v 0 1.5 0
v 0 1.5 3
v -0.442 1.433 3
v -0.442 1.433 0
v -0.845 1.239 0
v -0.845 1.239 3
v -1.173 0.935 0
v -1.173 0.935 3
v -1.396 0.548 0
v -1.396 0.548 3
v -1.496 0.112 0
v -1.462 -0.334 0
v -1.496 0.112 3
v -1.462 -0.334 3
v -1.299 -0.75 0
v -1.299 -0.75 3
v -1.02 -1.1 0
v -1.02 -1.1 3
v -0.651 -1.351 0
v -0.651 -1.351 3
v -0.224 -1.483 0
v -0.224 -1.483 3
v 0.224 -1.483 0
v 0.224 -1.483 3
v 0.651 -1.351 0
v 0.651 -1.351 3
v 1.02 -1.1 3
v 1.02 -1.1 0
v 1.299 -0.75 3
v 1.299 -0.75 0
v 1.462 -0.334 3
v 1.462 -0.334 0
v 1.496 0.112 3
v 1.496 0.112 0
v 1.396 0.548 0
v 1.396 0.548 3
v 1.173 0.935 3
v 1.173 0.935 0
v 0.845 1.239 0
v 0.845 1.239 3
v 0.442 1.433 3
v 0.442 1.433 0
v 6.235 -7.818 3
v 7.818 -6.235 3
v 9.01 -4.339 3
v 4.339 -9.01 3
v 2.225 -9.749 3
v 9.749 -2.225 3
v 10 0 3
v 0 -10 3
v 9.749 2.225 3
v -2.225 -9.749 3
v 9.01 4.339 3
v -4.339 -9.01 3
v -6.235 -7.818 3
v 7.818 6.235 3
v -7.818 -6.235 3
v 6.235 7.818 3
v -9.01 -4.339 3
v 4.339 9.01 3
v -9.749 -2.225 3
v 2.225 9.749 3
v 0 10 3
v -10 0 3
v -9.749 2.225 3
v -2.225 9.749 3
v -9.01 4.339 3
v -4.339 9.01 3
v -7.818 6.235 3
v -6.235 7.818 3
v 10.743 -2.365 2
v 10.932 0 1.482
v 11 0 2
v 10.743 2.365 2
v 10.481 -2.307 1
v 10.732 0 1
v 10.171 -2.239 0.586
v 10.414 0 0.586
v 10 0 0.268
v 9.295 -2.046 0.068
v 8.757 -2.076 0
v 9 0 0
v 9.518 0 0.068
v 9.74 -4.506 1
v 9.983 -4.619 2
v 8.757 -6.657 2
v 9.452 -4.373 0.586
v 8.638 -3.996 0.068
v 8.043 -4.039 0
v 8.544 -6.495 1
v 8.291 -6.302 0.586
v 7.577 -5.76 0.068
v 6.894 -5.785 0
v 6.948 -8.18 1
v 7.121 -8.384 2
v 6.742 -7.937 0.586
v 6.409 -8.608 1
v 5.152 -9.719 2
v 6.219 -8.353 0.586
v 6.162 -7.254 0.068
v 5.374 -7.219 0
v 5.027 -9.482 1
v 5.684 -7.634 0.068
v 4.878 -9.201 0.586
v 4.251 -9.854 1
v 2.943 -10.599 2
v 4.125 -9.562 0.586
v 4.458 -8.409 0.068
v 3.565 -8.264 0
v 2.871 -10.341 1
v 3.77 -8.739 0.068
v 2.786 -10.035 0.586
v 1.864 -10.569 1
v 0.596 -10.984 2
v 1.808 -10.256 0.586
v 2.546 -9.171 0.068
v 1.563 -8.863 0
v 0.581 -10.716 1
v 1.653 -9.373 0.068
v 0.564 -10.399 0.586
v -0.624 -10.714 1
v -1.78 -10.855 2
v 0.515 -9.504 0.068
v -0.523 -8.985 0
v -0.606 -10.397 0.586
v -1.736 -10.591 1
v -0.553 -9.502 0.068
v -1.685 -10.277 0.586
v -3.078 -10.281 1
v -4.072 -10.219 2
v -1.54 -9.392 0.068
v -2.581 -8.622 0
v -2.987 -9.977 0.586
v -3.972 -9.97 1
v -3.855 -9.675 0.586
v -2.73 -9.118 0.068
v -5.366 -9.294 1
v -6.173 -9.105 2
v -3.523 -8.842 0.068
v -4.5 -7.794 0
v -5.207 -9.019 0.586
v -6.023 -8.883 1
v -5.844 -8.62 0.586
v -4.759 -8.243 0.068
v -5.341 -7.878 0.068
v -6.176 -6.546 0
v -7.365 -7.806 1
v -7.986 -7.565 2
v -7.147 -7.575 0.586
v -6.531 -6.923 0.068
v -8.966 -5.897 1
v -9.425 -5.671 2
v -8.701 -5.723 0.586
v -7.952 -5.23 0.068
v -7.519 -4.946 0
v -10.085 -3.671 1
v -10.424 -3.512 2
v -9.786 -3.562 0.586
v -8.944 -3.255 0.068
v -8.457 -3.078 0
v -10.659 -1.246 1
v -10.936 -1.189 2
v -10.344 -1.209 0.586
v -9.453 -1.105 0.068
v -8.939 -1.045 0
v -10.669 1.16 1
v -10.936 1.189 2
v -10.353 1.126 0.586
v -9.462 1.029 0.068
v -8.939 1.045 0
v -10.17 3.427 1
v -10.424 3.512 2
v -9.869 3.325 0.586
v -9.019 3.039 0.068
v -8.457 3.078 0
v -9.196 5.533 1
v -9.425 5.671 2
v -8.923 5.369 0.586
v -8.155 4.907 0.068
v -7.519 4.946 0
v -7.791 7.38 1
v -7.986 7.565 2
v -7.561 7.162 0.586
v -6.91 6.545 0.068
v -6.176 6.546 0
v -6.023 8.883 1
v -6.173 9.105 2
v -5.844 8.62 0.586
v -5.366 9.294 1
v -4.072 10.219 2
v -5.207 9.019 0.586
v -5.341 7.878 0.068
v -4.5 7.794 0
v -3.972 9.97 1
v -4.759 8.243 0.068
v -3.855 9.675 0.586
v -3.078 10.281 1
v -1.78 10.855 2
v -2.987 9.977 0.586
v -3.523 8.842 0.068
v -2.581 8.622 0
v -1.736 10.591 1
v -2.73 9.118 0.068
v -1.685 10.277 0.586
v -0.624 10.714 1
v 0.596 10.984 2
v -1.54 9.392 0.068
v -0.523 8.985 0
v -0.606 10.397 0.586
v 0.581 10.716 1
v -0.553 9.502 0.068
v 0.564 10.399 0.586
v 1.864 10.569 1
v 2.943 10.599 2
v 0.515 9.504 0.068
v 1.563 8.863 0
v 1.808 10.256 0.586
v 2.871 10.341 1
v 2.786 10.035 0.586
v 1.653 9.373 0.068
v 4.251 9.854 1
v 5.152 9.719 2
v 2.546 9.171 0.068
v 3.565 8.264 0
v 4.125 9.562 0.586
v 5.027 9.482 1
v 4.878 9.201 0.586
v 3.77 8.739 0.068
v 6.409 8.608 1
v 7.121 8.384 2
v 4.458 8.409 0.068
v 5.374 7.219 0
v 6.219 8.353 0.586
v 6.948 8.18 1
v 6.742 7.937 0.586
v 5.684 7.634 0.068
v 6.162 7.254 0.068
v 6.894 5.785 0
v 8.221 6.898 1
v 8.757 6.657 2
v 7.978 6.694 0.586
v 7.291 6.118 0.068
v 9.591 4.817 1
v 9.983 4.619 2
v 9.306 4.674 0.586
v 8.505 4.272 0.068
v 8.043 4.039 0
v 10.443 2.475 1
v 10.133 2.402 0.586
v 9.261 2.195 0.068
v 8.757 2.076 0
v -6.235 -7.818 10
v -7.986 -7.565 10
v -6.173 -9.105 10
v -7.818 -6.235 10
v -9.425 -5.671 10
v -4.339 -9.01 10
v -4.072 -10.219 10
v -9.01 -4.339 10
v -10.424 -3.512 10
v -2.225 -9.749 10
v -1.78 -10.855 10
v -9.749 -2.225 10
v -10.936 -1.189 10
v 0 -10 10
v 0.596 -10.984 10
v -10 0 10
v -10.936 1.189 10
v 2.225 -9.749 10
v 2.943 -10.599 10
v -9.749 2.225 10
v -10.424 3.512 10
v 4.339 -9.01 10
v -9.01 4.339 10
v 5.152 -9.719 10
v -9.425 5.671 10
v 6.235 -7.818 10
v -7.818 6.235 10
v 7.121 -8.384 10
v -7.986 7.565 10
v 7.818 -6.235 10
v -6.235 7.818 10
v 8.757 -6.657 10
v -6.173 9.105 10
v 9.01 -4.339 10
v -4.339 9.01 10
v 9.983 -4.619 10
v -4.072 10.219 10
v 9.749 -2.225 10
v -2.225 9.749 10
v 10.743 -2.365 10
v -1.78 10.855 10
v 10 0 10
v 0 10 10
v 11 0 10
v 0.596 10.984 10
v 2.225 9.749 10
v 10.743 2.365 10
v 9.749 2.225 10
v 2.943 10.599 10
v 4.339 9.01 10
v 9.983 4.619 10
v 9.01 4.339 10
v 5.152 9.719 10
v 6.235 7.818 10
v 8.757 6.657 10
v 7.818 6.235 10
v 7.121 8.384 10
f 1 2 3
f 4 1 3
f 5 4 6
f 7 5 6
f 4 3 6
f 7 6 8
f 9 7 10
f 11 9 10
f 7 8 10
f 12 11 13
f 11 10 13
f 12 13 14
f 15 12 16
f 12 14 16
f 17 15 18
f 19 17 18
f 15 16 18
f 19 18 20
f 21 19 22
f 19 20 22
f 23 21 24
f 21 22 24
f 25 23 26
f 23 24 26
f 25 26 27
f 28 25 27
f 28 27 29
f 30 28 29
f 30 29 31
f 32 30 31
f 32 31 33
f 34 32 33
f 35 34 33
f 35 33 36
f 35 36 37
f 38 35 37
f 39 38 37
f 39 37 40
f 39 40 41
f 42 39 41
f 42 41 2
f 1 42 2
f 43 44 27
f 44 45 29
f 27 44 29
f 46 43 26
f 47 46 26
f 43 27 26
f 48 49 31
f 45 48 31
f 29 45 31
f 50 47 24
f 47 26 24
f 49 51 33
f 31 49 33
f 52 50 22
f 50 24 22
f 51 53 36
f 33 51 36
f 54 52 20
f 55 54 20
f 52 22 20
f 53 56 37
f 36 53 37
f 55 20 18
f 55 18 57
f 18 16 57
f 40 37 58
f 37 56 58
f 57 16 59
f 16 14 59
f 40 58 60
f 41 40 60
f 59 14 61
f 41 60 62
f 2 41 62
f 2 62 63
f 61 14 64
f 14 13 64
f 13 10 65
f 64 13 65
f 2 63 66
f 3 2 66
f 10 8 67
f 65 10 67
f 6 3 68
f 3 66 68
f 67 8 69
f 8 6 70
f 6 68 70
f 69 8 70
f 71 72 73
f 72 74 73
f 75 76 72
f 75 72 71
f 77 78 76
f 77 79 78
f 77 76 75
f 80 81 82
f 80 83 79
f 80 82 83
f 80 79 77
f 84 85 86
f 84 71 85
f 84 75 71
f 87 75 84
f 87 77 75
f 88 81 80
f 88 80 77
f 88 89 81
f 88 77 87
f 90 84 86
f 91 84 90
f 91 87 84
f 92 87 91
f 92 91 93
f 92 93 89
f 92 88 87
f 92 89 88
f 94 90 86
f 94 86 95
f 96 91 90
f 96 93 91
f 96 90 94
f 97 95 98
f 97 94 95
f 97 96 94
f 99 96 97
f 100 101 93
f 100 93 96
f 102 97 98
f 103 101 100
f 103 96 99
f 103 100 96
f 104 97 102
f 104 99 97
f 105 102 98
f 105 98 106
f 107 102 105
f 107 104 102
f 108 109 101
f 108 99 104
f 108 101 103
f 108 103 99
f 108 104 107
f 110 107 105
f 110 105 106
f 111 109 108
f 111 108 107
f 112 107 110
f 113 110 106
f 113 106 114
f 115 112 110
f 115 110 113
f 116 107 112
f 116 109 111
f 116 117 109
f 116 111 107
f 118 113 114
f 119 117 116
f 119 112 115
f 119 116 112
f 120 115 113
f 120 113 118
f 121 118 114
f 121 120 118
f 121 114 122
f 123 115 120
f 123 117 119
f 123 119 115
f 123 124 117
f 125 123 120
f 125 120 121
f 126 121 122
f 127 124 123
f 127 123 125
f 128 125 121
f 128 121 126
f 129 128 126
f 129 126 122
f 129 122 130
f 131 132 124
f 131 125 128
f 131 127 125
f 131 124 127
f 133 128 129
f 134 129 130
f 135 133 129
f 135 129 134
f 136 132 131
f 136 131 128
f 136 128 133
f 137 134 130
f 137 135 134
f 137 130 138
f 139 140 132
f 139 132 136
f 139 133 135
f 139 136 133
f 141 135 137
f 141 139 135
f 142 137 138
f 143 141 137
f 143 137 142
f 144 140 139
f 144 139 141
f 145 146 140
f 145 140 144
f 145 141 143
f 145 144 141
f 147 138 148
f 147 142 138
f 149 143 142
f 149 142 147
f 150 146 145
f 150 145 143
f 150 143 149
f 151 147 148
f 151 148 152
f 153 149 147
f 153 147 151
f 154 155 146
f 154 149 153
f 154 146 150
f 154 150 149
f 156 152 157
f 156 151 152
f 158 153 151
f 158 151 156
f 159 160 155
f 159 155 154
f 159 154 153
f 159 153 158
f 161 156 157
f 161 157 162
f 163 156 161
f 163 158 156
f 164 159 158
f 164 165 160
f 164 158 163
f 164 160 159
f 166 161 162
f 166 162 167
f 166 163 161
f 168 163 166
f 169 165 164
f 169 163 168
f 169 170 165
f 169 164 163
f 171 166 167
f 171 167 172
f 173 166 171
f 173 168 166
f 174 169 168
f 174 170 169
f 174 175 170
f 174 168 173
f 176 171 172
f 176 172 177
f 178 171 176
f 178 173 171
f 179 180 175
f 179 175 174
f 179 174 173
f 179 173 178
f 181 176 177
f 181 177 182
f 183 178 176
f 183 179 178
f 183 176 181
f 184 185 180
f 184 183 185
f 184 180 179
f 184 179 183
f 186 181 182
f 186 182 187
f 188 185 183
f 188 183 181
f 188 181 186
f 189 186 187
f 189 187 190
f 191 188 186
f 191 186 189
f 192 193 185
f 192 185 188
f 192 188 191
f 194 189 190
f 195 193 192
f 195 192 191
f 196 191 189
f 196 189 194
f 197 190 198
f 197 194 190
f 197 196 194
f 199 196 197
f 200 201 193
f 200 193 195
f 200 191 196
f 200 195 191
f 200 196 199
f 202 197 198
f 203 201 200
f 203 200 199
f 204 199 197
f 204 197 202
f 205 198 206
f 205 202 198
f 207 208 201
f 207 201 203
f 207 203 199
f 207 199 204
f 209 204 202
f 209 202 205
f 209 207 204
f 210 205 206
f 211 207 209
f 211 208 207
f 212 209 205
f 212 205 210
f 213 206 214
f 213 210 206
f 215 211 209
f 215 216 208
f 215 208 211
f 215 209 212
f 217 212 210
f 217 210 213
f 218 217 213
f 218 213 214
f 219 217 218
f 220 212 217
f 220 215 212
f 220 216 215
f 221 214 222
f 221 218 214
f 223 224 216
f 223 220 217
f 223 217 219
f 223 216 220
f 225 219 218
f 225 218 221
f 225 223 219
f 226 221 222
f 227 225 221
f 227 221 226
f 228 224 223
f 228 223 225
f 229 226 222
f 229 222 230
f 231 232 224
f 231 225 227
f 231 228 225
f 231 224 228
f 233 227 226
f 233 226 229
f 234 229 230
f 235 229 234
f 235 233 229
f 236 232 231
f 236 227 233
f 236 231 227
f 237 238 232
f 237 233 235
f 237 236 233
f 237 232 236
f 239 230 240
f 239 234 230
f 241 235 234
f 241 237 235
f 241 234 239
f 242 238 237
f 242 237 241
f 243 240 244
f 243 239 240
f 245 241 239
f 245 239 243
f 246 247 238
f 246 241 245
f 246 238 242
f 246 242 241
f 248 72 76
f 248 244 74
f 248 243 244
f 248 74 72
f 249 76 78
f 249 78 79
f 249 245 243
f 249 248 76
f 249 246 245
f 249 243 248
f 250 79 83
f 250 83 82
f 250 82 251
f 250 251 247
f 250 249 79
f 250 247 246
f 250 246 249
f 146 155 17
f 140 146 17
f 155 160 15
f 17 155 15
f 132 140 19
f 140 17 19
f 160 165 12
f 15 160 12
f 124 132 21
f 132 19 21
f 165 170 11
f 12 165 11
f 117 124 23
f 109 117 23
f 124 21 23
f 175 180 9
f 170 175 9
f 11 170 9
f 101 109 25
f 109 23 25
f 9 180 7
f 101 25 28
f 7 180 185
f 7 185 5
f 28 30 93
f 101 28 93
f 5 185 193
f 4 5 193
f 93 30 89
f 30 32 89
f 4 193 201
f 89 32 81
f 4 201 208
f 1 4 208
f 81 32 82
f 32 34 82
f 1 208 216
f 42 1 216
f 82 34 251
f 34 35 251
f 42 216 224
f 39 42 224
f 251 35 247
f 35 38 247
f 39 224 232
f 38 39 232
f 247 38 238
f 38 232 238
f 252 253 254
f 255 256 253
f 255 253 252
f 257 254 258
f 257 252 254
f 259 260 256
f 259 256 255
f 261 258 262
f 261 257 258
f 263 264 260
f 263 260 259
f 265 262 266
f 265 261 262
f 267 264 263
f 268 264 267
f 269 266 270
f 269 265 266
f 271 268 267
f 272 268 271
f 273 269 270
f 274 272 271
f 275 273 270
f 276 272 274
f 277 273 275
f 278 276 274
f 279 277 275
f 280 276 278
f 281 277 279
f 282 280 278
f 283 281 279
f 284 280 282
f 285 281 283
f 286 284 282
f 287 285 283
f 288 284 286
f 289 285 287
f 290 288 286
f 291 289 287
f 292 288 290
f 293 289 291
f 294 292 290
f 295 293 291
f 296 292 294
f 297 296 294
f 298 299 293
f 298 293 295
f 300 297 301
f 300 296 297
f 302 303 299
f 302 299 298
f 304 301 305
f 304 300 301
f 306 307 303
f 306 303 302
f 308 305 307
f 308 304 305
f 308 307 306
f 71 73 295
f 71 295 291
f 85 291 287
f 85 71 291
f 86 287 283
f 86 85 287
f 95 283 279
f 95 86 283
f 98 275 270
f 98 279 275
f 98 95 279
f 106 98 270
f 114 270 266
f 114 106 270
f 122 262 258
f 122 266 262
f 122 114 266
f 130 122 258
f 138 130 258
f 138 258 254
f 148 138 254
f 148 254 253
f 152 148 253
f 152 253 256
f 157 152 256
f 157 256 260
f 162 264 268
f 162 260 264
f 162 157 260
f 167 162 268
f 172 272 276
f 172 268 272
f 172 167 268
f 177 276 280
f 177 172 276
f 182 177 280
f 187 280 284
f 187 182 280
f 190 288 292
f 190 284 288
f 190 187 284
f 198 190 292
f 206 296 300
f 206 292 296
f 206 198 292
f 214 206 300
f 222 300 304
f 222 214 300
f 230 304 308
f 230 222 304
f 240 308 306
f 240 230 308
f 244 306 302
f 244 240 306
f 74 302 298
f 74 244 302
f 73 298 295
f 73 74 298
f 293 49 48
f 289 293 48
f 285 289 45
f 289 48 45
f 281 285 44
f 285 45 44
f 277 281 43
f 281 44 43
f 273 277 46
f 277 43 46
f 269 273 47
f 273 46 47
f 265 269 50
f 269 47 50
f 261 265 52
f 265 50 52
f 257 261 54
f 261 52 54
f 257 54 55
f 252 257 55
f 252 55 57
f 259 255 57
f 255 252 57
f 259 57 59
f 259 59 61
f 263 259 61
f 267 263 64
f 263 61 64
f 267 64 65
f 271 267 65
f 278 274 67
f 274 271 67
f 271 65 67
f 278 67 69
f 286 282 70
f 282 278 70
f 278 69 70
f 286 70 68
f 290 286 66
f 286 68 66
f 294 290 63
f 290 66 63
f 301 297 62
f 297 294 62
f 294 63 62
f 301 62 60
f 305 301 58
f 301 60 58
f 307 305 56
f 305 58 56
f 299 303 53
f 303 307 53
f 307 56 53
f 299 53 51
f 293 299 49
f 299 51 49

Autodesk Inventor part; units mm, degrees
ref_plane "YZ Plane" through (0, 0, 0) normal (1, 0, 0) x (0, 1, 0)
ref_plane "XZ Plane" through (0, 0, 0) normal (0, 1, 0) x (-1, 0, 0)
ref_plane "XY Plane" through (0, 0, 0) normal (0, 0, 1) x (1, 0, 0)
sketch "Sketch1" plane through (0, 0, 0) normal (0, 0, 1) x (1, 0, 0)
  circle A0 centre (0, 0) radius 10
  circle A1 centre (0, 0) radius 11
  dimension "d0" = 22
  dimension "d4" = 20
extrude "Extrusion1" add sketch "Sketch1" along normal blind 10
sketch "Sketch2" plane through (0, 0, 0) normal (0, 0, -1) x (-1, 0, 0)
  circle A0 centre (0, 0) radius 10 projected
extrude "Extrusion2" add sketch "Sketch2" against normal blind 3
sketch "Sketch3" plane through (0, 0, 0) normal (0, 0, -1) x (-1, 0, 0)
  point P0 (0, 0)
  point P1 (0, 0)
hole "Hole1" at (0, 0, 0) direction (0, 0, 1) diameter 3 end through all
thread "Thread1" size "M3x0.5" class "6H" standard "ANSI Metric M Profile" full length
fillet "Fillet1" radius 2 1 edges at (-11, 0, 0)
properties part number "Cathode Screen" material "Stainless Steel"
